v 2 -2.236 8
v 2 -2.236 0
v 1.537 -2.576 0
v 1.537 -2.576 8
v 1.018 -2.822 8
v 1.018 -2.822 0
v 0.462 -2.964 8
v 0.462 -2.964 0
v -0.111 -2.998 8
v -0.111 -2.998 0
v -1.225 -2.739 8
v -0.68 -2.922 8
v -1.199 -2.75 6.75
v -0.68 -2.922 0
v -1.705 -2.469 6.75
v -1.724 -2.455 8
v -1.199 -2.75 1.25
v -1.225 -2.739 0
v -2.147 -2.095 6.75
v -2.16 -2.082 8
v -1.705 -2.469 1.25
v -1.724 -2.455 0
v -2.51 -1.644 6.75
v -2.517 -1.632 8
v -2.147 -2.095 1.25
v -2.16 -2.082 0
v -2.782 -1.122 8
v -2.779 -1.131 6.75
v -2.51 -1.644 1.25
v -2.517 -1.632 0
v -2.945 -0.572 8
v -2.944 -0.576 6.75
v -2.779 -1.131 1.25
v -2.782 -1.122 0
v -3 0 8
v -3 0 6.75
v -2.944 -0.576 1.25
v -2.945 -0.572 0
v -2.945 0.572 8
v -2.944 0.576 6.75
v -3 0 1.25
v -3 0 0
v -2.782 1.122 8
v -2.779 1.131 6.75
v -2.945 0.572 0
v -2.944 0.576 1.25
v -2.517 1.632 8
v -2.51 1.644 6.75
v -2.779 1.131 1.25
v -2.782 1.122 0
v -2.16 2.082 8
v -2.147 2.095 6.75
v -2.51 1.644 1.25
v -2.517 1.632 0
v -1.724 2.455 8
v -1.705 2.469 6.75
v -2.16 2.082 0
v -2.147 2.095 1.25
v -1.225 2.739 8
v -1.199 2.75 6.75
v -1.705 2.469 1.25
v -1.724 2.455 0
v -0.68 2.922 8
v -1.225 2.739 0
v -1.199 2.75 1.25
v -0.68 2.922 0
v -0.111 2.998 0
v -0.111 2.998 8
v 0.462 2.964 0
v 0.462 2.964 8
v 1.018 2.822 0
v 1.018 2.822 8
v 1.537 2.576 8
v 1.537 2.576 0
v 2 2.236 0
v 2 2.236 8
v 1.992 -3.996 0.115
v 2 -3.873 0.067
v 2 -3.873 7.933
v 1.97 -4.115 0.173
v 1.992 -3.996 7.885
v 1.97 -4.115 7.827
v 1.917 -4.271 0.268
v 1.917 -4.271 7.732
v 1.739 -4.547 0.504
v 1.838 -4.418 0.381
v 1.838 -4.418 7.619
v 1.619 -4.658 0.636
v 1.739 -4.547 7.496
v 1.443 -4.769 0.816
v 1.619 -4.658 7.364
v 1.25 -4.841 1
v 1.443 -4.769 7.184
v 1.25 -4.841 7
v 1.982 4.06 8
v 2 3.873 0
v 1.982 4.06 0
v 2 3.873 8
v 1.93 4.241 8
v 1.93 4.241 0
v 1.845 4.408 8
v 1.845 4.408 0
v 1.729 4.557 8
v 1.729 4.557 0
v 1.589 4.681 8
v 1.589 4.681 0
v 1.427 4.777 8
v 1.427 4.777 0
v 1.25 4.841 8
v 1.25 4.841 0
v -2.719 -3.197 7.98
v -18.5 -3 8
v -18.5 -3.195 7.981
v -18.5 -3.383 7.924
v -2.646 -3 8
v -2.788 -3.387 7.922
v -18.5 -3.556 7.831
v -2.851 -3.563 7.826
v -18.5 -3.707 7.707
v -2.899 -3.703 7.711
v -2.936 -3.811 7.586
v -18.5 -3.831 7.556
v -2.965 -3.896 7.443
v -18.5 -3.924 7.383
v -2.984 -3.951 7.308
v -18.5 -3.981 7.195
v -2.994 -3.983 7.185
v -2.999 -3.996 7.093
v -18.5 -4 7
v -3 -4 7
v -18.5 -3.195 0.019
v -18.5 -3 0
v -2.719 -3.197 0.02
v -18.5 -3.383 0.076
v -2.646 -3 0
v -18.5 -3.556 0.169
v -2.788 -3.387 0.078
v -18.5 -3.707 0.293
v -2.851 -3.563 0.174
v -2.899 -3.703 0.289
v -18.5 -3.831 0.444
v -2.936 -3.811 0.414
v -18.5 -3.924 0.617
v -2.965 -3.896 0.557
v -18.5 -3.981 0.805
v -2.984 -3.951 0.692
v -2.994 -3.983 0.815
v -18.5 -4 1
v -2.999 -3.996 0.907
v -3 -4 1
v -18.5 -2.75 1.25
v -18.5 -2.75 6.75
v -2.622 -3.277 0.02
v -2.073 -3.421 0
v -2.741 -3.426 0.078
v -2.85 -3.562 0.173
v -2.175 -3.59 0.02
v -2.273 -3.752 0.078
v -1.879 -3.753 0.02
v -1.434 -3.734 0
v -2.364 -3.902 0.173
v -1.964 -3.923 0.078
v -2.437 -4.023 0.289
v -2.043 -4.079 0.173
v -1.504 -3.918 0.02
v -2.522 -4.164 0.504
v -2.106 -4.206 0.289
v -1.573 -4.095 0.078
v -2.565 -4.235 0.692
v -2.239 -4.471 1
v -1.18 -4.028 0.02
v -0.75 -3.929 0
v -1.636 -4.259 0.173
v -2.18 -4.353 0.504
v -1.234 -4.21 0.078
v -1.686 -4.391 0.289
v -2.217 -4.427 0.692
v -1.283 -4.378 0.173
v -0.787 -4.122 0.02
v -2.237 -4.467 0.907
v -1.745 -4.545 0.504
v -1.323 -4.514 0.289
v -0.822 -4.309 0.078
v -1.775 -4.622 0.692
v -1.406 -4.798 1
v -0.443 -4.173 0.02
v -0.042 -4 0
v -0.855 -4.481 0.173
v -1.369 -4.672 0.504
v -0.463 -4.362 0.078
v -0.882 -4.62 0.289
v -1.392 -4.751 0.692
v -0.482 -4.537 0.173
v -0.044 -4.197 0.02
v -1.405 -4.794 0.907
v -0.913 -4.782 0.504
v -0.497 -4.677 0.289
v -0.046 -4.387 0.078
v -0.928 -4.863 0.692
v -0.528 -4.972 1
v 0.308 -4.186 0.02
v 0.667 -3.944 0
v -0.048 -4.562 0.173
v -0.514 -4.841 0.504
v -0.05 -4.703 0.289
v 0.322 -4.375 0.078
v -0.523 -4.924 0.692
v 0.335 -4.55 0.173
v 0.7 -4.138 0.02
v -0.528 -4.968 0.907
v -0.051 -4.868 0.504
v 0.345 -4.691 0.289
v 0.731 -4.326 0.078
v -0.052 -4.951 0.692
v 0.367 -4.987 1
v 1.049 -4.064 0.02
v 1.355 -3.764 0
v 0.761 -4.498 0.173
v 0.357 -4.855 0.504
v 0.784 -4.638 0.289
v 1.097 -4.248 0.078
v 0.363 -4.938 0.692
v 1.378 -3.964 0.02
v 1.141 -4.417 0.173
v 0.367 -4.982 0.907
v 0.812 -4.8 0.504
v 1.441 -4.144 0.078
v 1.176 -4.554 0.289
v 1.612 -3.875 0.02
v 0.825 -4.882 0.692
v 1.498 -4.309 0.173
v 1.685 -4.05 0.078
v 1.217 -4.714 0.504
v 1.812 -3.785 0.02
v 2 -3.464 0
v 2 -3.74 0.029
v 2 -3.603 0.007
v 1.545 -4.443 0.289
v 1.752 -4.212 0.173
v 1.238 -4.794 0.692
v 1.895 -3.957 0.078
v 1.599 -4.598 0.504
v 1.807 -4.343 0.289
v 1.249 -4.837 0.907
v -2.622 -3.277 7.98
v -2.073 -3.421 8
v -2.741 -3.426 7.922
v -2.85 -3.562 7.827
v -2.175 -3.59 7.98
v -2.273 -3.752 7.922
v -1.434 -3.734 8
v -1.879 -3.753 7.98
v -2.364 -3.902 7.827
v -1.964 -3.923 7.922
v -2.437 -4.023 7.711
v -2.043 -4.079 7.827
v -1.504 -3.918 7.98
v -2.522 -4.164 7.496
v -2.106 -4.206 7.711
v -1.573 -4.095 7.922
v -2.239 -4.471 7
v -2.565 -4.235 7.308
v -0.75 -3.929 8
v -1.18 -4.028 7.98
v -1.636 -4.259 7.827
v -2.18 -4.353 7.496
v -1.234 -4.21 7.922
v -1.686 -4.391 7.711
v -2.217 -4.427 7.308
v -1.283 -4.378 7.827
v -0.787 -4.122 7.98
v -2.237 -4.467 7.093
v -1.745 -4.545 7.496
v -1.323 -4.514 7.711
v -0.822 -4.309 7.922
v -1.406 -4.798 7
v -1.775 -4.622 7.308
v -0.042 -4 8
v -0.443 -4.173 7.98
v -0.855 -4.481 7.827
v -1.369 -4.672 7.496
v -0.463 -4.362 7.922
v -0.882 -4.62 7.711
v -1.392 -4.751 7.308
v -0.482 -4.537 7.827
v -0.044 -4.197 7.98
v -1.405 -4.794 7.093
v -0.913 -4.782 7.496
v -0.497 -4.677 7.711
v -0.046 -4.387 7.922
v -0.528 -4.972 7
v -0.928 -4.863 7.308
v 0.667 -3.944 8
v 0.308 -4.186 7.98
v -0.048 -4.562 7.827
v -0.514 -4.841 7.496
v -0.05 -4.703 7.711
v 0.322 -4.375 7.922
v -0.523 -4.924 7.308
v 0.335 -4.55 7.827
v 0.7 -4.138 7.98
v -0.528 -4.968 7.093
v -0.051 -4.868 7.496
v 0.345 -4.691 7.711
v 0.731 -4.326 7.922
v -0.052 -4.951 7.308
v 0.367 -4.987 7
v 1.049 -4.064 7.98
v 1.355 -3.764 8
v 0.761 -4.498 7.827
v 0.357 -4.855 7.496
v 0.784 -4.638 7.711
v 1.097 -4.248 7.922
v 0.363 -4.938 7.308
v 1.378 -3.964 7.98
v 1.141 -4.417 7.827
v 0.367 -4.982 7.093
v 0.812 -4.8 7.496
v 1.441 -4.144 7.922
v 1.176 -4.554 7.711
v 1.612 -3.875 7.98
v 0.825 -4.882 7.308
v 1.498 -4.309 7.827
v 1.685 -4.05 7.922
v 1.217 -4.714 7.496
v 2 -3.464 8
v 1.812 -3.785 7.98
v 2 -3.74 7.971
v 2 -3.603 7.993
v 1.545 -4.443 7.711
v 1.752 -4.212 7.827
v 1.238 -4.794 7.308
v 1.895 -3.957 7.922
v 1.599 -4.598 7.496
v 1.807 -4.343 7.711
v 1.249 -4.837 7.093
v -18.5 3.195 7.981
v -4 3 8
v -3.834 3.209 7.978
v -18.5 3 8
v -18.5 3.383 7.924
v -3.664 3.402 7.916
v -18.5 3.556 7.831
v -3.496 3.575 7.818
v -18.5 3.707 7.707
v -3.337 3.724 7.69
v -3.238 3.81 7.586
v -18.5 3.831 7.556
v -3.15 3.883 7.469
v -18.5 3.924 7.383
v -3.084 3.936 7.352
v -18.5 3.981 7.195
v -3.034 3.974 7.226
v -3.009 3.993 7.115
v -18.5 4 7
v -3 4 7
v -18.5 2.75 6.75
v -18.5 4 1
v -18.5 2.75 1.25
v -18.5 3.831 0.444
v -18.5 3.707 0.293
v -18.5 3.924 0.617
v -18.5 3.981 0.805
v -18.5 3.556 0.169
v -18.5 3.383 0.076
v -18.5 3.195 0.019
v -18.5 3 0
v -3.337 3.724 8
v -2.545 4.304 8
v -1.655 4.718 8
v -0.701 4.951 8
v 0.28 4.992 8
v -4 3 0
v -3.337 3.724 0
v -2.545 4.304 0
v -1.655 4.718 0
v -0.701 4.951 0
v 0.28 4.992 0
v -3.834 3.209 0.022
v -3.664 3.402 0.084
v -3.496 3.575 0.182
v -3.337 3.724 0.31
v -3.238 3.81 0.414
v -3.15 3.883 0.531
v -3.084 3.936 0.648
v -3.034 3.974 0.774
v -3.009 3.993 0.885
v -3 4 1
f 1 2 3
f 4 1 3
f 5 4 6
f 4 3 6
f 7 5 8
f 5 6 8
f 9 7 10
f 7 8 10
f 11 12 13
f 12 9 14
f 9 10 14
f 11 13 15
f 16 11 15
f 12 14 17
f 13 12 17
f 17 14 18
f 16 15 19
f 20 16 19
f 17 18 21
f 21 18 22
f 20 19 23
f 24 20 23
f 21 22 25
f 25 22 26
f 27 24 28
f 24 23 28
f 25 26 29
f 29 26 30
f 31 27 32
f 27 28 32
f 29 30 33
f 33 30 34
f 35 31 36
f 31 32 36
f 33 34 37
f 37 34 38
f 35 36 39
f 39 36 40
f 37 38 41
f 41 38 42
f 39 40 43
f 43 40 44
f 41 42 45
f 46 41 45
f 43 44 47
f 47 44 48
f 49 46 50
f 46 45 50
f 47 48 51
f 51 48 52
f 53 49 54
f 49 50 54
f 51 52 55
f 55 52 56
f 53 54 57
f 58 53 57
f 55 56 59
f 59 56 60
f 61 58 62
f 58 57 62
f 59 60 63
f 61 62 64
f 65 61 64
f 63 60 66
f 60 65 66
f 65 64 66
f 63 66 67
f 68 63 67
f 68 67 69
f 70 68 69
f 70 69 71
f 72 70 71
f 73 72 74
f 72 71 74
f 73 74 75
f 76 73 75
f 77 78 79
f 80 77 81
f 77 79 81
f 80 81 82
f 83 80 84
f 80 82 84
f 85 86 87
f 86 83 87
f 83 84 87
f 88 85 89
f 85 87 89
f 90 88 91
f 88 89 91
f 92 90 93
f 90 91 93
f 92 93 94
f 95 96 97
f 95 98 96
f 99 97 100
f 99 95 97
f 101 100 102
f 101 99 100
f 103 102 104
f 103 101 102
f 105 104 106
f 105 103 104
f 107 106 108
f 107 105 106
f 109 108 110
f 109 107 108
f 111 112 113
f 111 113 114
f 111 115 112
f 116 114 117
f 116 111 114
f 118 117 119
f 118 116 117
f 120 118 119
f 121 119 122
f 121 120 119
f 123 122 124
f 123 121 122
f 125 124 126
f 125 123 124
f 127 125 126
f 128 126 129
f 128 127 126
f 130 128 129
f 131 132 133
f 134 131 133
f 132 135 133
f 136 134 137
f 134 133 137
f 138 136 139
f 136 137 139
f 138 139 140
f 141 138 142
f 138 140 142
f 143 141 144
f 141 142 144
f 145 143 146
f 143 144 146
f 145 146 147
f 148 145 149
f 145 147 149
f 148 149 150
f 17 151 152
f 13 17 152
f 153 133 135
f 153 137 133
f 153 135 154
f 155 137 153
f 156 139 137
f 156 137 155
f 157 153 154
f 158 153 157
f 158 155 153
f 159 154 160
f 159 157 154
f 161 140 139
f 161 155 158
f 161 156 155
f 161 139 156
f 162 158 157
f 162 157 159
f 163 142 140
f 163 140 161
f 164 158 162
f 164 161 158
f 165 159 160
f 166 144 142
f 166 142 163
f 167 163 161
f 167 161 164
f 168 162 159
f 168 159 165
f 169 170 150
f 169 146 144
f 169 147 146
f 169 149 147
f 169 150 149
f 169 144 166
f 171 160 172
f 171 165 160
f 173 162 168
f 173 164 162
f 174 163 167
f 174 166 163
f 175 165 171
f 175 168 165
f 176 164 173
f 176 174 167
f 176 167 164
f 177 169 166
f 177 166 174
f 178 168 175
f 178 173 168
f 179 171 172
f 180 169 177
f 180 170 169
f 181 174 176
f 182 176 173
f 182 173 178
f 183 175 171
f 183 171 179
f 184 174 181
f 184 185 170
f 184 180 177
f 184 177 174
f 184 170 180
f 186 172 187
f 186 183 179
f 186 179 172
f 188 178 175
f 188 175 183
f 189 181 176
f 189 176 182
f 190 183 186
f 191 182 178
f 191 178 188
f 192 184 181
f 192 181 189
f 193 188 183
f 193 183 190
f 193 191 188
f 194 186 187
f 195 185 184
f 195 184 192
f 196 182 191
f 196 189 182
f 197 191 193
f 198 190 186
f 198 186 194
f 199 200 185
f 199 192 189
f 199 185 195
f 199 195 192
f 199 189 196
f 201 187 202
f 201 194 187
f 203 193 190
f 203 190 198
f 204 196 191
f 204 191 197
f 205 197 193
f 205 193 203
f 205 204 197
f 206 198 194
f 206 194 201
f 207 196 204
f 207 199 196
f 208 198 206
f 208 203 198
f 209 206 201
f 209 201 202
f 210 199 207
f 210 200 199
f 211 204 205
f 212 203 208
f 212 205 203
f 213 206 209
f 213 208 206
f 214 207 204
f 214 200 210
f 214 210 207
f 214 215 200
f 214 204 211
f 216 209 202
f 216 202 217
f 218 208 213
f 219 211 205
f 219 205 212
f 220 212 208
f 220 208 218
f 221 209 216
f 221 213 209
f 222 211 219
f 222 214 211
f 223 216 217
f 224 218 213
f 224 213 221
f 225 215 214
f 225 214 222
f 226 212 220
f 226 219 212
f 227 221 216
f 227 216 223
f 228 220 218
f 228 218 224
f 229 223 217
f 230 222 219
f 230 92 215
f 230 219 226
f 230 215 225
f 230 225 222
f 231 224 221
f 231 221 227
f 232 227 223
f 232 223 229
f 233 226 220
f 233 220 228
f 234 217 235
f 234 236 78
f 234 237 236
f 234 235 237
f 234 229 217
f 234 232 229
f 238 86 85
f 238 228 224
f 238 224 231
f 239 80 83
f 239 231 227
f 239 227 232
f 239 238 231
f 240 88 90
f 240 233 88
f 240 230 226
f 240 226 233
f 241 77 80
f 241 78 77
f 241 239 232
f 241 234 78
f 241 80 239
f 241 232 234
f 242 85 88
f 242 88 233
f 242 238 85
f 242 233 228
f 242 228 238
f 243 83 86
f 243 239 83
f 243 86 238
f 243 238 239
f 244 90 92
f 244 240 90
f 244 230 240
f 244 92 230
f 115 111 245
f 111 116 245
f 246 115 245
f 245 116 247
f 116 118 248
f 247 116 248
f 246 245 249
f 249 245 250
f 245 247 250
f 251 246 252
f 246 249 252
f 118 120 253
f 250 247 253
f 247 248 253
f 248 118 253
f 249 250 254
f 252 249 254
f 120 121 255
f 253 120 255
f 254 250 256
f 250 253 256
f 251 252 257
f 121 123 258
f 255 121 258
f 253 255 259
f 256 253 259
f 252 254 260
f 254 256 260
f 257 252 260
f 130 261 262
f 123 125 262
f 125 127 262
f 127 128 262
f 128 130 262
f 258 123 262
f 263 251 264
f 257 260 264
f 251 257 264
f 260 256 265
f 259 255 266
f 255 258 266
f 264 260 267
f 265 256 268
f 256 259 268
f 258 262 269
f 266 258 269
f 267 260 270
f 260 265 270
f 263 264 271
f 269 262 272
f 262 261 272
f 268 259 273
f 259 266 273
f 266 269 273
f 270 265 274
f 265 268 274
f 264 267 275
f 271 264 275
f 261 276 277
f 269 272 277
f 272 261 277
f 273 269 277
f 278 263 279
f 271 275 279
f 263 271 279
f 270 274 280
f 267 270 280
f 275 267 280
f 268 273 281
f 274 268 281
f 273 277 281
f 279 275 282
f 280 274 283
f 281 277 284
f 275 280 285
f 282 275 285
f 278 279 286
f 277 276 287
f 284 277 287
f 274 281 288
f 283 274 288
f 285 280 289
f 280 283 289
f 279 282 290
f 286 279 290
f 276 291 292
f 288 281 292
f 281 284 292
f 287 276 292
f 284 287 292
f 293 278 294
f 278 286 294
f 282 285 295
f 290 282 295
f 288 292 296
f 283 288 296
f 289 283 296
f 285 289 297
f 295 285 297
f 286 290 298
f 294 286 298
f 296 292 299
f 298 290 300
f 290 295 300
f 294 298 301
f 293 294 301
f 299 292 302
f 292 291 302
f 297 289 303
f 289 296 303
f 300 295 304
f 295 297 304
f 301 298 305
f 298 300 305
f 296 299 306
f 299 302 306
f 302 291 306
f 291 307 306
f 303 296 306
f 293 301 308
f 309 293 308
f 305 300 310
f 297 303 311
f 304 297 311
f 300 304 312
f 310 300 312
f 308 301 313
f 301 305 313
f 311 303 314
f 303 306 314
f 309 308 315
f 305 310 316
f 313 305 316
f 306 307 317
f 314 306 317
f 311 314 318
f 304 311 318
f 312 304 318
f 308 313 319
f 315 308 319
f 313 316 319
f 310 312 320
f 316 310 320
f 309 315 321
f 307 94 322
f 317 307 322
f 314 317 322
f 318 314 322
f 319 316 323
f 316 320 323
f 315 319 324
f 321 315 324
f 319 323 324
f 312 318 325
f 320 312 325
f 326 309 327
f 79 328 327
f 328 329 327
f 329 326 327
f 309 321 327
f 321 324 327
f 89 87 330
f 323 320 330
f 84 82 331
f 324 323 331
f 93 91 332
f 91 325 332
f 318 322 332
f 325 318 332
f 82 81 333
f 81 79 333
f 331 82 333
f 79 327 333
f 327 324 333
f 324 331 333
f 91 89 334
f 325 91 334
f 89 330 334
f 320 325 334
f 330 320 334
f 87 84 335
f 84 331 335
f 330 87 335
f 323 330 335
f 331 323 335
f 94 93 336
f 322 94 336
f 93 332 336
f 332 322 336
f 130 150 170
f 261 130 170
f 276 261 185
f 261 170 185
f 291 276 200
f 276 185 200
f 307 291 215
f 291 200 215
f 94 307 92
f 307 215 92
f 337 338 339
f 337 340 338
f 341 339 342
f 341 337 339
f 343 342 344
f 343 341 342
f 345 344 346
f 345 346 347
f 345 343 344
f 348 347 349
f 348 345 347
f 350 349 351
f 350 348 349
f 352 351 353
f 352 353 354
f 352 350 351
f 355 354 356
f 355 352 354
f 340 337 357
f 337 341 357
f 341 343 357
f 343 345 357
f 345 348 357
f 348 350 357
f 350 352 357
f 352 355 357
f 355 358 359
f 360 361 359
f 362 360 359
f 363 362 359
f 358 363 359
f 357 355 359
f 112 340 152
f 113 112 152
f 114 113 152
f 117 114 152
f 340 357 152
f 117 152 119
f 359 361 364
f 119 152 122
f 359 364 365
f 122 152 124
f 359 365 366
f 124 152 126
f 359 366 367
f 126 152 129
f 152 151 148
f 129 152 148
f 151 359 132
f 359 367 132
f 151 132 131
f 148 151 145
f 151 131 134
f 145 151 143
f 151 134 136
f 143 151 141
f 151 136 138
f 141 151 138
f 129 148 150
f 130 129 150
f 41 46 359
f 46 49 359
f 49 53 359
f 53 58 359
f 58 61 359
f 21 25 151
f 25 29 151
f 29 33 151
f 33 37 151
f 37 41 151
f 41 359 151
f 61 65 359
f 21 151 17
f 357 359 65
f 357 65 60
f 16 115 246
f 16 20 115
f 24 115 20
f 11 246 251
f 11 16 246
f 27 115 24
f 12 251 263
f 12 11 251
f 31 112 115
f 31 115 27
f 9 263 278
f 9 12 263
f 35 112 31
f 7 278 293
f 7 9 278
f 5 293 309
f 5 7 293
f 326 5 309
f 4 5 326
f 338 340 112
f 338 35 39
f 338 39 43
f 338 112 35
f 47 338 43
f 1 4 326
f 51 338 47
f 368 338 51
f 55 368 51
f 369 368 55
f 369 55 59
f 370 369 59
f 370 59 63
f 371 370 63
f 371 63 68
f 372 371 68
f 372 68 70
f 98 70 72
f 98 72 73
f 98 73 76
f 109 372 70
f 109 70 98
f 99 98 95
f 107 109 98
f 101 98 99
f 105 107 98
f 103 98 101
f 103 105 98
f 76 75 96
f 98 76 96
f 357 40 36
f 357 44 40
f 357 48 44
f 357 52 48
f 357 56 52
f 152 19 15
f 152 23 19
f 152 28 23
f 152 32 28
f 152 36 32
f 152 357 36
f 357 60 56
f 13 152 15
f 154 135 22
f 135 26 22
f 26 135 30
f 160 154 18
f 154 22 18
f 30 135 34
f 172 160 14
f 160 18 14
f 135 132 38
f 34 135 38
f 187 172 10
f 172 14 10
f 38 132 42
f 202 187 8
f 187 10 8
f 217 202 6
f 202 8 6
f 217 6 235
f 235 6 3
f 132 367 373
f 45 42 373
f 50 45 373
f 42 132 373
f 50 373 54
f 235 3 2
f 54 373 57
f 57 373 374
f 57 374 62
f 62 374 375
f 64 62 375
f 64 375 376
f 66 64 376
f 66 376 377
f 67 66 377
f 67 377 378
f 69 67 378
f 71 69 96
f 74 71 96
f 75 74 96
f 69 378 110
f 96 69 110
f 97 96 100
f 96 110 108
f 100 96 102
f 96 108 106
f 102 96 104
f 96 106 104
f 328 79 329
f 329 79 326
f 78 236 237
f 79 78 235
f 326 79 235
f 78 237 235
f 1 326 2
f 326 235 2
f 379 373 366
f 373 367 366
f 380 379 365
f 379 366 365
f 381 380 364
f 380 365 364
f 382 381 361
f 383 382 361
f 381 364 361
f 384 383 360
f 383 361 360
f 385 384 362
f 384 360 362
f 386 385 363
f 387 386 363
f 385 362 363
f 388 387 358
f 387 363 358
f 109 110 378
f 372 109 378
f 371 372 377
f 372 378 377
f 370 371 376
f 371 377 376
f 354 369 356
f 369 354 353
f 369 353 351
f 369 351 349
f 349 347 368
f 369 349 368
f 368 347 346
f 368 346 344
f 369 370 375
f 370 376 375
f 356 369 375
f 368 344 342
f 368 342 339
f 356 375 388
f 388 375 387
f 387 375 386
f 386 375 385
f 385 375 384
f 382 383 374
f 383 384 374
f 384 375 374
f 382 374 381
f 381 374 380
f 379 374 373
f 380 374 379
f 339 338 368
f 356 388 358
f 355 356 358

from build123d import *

# Parameters (mm, degrees)
F1_DEPTH = 8
F2_W     = 5.5
F2_H     = 5.5
F3_DEPTH = 17.3020421192
F4_R     = 1


# Not quite as in the source:
# - a feature names something its author has since deleted; it is built from what else it names


with BuildPart() as f1:
    # F0 (on Top) → F1 (new body)
    with BuildSketch(Plane.XY):
        with BuildLine():
            ThreePointArc((2, -2.2360679775), (-3, 0), (2, 2.2360679775))
            Line((2, 2.2360679775), (2, 4.582575695))
            ThreePointArc((2, 4.582575695), (-0.5786610494, 4.9664022582), (-3, 4))
            ThreePointArc((-3, 4), (-5, 0), (-3, -4))
            ThreePointArc((-3, -4), (-0.5786610494, -4.9664022582), (2, -4.582575695))
            Line((2, -4.582575695), (2, -2.2360679775))
        make_face()
        with BuildLine():
            ThreePointArc((-3, -4), (-5, 0), (-3, 4))
            Line((-3, 4), (-18.5, 4))
            Line((-18.5, 4), (-18.5, -4))
            Line((-18.5, -4), (-3, -4))
        make_face()
    extrude(amount=F1_DEPTH)

    # F2 (on face) → F3 (cut, through all)
    with BuildSketch(Plane(origin=(-18.5, 0, 0), x_dir=(0, -1, 0), z_dir=(-1, 0, 0))):
        with Locations((0, 4)):
            Rectangle(F2_W, F2_H)
    extrude(amount=-F3_DEPTH, mode=Mode.SUBTRACT)

    # F4
    f4_edges = [f1.edges().sort_by_distance(p)[0] for p in [
        (2, 4.582576, 4),
        (2, -4.582576, 4),
        (-10.75, -4, 0),
        (-10.75, 4, 8),
        (-10.75, 4, 0),
        (-10.75, -4, 8),
        (-0.578661, -4.966402, 8),
        (-0.578661, -4.966402, 0),
    ]]
    fillet(f4_edges, radius=F4_R)


solid = f1.part
